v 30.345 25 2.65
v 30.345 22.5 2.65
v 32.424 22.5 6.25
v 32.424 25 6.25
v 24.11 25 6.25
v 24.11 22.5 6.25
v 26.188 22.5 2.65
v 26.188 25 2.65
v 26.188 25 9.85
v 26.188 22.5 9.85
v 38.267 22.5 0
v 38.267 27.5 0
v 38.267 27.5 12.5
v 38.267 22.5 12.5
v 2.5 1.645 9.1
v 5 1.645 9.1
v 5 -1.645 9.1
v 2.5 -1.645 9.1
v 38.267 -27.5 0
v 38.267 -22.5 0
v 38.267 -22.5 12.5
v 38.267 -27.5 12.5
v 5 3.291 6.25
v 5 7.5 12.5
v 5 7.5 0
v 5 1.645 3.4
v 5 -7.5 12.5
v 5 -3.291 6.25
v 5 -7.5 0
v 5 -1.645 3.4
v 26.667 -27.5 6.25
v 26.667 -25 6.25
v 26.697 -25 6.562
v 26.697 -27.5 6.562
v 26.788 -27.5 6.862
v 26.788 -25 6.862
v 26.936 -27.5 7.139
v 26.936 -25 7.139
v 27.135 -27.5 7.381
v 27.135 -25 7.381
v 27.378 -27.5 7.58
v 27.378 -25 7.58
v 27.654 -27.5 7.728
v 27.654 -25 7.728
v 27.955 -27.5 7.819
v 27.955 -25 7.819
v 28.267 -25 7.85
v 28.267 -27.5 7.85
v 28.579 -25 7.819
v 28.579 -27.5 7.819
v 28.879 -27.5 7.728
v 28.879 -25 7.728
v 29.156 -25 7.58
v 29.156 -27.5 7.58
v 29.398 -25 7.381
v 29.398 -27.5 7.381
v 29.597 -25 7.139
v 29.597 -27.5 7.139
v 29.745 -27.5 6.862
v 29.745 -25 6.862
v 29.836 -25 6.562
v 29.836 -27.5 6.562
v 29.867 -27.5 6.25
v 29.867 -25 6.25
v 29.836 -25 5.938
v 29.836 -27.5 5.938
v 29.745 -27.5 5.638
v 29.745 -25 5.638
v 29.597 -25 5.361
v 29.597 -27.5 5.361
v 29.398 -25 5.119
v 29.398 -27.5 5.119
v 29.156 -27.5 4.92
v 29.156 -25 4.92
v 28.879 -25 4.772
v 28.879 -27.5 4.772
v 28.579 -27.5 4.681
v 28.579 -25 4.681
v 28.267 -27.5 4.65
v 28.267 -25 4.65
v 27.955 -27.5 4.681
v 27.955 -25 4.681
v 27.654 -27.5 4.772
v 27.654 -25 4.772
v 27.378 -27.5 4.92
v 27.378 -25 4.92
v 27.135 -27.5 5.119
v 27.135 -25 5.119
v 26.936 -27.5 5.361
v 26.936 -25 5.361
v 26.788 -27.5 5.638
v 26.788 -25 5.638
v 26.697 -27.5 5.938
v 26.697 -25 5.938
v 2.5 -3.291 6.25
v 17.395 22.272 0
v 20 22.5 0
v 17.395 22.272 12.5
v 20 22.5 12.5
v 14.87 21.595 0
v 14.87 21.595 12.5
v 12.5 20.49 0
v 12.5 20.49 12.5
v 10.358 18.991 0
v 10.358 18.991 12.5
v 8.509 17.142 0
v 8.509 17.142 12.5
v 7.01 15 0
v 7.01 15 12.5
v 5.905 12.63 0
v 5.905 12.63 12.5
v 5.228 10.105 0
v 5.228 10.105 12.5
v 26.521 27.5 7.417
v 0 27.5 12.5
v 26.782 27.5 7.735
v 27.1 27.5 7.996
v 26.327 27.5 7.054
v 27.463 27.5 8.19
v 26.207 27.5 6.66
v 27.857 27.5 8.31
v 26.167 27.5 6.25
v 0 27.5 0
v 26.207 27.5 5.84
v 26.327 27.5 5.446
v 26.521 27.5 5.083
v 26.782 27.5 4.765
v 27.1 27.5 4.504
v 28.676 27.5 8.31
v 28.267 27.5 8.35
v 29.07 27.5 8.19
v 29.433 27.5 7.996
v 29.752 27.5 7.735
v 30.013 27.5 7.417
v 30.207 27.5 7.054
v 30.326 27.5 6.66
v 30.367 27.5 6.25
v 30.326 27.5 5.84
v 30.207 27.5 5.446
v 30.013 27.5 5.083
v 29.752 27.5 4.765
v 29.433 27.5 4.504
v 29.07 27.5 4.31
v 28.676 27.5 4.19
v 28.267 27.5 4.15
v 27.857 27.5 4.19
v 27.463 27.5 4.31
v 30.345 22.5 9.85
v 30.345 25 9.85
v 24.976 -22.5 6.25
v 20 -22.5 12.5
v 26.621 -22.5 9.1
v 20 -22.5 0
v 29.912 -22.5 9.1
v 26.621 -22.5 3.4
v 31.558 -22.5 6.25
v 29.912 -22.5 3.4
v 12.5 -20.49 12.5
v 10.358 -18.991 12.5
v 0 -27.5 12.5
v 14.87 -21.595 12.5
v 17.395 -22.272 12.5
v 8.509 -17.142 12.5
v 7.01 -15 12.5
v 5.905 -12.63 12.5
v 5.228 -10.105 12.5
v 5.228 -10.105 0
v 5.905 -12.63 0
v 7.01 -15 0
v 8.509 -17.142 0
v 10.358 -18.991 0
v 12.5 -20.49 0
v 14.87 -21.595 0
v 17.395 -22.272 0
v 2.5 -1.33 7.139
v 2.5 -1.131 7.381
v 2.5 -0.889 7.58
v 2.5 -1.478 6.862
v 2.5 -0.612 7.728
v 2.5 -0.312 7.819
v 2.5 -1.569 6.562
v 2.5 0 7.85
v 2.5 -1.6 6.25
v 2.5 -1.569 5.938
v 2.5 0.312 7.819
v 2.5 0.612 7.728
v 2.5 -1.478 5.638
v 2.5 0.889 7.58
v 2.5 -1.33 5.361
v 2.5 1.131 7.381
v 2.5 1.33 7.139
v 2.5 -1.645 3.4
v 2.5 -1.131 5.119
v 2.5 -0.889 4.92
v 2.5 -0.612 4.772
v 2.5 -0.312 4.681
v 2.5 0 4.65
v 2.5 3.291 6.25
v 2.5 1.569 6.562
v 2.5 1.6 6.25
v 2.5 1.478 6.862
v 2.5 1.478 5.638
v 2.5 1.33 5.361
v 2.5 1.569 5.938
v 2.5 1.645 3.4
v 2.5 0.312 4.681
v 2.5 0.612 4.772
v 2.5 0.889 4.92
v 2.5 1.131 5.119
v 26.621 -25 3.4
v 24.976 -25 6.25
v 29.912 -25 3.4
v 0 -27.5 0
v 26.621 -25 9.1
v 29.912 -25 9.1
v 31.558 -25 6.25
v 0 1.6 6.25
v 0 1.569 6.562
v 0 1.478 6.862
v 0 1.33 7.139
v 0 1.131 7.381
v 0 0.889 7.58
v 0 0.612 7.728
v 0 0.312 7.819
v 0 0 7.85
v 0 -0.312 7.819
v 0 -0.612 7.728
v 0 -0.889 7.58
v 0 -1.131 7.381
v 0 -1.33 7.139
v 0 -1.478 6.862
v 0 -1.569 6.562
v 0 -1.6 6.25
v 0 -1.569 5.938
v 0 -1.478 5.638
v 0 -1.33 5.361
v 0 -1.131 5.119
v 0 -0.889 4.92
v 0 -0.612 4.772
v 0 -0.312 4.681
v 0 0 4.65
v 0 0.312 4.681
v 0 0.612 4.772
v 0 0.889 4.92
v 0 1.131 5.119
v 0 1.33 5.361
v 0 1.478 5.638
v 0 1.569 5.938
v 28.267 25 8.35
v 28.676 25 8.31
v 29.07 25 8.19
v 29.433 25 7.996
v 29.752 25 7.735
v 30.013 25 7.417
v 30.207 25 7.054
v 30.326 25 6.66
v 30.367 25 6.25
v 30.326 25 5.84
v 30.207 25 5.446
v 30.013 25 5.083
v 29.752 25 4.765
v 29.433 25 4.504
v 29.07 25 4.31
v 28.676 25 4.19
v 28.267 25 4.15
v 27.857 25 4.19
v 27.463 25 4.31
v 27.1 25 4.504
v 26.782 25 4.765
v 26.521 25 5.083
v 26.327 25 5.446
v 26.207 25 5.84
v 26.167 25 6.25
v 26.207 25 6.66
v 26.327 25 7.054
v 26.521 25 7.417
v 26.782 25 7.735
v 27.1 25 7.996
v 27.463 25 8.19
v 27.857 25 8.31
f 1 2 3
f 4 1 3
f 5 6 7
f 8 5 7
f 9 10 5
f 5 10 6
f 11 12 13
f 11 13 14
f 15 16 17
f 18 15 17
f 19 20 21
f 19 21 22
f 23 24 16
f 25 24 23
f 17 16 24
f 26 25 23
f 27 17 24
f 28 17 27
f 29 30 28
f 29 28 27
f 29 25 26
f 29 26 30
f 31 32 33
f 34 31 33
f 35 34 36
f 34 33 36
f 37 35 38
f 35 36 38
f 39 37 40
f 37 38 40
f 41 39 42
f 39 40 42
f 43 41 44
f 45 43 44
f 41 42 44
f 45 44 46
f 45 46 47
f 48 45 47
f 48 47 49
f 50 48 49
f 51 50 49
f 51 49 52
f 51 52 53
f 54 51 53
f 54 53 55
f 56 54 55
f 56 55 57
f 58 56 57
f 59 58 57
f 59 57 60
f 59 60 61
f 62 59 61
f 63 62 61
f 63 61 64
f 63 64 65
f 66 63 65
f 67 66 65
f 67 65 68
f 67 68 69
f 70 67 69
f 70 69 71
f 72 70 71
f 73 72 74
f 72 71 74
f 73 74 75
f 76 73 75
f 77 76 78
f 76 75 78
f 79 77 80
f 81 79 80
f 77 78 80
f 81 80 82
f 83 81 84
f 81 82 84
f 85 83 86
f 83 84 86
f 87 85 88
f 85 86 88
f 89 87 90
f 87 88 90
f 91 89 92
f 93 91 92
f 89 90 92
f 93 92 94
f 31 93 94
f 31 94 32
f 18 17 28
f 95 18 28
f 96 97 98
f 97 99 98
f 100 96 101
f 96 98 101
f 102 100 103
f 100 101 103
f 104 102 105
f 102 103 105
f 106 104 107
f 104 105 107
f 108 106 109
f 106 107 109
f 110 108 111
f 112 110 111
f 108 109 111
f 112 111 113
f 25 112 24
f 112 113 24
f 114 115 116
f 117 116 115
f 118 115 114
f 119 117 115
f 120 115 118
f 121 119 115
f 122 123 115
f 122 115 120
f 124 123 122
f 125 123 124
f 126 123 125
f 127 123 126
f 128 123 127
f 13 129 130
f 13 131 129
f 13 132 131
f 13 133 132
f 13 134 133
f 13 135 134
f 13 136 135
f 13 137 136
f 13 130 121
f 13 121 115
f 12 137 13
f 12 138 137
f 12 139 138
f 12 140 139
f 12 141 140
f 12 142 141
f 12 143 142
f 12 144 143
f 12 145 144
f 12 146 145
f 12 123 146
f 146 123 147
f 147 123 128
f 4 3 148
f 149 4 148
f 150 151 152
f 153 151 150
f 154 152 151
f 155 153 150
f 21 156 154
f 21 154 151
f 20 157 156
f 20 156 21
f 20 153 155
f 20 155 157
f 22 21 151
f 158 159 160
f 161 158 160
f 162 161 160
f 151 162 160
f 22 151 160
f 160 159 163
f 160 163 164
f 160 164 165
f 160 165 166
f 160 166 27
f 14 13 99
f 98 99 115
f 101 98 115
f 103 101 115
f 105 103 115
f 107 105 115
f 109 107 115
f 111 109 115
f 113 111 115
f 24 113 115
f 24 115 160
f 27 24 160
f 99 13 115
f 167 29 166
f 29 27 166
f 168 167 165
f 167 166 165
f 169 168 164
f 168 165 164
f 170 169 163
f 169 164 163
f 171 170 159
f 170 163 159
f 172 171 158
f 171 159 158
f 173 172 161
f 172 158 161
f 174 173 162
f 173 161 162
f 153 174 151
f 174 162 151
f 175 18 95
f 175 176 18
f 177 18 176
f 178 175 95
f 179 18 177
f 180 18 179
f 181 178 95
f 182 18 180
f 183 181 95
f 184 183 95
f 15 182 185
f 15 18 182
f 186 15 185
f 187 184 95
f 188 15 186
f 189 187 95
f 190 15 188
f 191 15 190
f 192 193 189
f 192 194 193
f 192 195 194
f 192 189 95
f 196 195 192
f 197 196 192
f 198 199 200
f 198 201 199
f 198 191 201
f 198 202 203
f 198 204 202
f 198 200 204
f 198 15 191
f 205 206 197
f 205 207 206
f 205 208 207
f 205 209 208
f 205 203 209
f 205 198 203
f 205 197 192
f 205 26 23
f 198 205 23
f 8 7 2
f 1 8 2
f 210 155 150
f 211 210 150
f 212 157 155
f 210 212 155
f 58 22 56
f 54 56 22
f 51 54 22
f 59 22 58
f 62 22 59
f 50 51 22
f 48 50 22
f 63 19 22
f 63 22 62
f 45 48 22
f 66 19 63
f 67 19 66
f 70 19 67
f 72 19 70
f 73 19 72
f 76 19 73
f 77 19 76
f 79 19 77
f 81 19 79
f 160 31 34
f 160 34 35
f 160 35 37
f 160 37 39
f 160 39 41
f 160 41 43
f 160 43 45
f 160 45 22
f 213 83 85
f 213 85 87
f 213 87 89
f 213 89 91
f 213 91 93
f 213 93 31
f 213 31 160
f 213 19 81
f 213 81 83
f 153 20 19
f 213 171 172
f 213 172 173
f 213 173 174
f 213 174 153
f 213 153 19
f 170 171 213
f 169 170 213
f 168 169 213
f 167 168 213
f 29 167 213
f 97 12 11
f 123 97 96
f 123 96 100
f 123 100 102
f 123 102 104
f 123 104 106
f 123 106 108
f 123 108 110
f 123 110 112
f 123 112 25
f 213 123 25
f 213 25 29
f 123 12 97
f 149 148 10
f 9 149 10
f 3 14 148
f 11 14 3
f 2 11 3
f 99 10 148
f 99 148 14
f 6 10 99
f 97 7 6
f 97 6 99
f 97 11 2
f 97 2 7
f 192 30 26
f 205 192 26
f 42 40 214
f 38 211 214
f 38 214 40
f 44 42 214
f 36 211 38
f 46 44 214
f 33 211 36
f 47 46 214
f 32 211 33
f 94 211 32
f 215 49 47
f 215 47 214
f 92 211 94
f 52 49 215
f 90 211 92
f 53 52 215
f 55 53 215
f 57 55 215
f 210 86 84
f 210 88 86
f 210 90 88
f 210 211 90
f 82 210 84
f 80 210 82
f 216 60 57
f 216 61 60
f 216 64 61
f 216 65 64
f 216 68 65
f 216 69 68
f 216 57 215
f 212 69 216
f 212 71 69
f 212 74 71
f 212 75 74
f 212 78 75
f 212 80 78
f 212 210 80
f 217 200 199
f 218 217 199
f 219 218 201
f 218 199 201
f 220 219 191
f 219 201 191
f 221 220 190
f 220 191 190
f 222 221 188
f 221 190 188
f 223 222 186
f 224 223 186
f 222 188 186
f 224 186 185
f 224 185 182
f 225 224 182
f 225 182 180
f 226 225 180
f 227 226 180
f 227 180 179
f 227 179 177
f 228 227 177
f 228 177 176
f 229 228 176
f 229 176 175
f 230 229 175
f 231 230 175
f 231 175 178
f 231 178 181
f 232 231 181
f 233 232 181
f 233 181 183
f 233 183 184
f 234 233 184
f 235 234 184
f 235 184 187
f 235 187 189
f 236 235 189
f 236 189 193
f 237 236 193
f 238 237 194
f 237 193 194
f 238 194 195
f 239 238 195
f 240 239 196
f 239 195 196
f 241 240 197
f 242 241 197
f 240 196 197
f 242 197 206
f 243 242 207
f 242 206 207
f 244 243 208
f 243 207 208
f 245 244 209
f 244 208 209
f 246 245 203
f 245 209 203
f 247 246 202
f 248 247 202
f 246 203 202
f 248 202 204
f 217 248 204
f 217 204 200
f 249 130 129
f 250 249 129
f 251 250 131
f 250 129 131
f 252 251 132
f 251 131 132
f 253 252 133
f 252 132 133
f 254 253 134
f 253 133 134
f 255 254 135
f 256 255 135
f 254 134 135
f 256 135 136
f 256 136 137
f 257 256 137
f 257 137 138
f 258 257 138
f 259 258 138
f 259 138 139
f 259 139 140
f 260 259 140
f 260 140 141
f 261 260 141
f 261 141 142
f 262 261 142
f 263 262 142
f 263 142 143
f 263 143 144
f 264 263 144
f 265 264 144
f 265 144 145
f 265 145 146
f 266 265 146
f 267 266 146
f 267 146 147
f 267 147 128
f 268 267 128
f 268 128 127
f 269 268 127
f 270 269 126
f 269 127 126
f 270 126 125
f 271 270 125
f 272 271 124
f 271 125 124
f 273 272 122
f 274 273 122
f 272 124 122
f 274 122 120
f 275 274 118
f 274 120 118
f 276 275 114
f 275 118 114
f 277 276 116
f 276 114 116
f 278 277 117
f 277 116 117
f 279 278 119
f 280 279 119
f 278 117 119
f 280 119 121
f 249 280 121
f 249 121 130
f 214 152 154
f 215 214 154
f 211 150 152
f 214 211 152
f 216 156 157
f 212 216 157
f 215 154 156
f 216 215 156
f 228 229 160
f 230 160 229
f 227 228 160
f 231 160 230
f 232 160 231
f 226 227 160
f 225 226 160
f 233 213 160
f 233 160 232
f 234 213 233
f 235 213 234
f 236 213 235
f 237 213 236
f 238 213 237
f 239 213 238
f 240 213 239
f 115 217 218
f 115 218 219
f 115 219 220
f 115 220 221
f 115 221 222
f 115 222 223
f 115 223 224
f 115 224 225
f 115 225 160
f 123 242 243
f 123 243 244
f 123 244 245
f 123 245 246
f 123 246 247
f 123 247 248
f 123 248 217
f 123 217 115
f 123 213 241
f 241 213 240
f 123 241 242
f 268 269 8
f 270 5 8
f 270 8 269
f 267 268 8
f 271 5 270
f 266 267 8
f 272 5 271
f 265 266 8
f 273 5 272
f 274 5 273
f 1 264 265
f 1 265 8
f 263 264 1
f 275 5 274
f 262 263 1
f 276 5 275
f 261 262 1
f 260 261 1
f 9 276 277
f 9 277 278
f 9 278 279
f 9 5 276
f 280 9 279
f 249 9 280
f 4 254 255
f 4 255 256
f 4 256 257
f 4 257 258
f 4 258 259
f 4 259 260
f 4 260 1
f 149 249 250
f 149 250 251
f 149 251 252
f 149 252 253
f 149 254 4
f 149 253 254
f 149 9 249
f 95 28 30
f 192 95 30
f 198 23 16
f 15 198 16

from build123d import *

# Parameters (mm, degrees)
BOSS_EXTRUDE1_DEPTH = 12.5
FILLET1_R           = 15
SKETCH2_R           = 2.1
CUT_EXTRUDE1_DEPTH  = 5
CUT_EXTRUDE2_DEPTH  = 2.5
SKETCH4_R           = 1.6
CUT_EXTRUDE3_DEPTH  = 5
CUT_EXTRUDE4_DEPTH  = 2.5
SKETCH6_R           = 1.6
CUT_EXTRUDE5_DEPTH  = 49.75282328
CUT_EXTRUDE6_DEPTH  = 2.5


with BuildPart() as part:
    # Sketch1 → Boss-Extrude1 (new body)
    with BuildSketch(Plane.XY):
        Polygon((38.266666667, 27.5), (38.266666667, 22.5), (5, 22.5), (5, -22.5), (38.266666667, -22.5), (38.266666667, -27.5), (0, -27.5), (0, 27.5), align=None)
    extrude(amount=BOSS_EXTRUDE1_DEPTH)

    # Fillet1
    fillet1_edges = [part.edges().sort_by_distance(p)[0] for p in [
        (5, 22.5, 6.25),
        (5, -22.5, 6.25),
    ]]
    fillet(fillet1_edges, radius=FILLET1_R)

    # Sketch2 → Cut-Extrude1 (cut)
    with BuildSketch(Plane(origin=(0, 27.5, 0), x_dir=(1, 0, 0), z_dir=(0, 1, 0))):
        with Locations(Location((28.266666667, -6.25, 0), (0, 0, 270))):
            Circle(SKETCH2_R)
    extrude(amount=-CUT_EXTRUDE1_DEPTH, mode=Mode.SUBTRACT)

    # Sketch3 → Cut-Extrude2 (cut)
    with BuildSketch(Plane.XZ.offset(-22.5)):
        Polygon((30.345127636, 9.85), (26.188205698, 9.85), (24.109744729, 6.25), (26.188205698, 2.65), (30.345127636, 2.65), (32.423588605, 6.25), align=None)
    extrude(amount=-CUT_EXTRUDE2_DEPTH, mode=Mode.SUBTRACT)

    # Sketch4 → Cut-Extrude3 (cut)
    with BuildSketch(Plane(origin=(0, -22.5, 0), x_dir=(1, 0, 0), z_dir=(0, 1, 0))):
        with Locations(Location((28.266666667, -6.25, 0), (0, 0, 180))):
            Circle(SKETCH4_R)
    extrude(amount=-CUT_EXTRUDE3_DEPTH, mode=Mode.SUBTRACT)

    # Sketch5 → Cut-Extrude4 (cut)
    with BuildSketch(Plane(origin=(0, -22.5, 0), x_dir=(1, 0, 0), z_dir=(0, 1, 0))):
        Polygon((29.912114934, -3.4), (26.621218399, -3.4), (24.975770132, -6.25), (26.621218399, -9.1), (29.912114934, -9.1), (31.557563201, -6.25), align=None)
    extrude(amount=-CUT_EXTRUDE4_DEPTH, mode=Mode.SUBTRACT)

    # Sketch6 → Cut-Extrude5 (cut, through all)
    with BuildSketch(Plane(origin=(38.266666667, 0, 0), x_dir=(0, 0, -1), z_dir=(1, 0, 0))):
        with Locations(Location((-6.25, 0, 0), (0, 0, 90))):
            Circle(SKETCH6_R)
    extrude(amount=-CUT_EXTRUDE5_DEPTH, mode=Mode.SUBTRACT)

    # Sketch7 → Cut-Extrude6 (cut)
    with BuildSketch(Plane(origin=(5, 0, 0), x_dir=(0, 0, -1), z_dir=(1, 0, 0))):
        Polygon((-3.4, -1.645448267), (-3.4, 1.645448267), (-6.25, 3.290896534), (-9.1, 1.645448267), (-9.1, -1.645448267), (-6.25, -3.290896534), align=None)
    extrude(amount=-CUT_EXTRUDE6_DEPTH, mode=Mode.SUBTRACT)


solid = part.part
